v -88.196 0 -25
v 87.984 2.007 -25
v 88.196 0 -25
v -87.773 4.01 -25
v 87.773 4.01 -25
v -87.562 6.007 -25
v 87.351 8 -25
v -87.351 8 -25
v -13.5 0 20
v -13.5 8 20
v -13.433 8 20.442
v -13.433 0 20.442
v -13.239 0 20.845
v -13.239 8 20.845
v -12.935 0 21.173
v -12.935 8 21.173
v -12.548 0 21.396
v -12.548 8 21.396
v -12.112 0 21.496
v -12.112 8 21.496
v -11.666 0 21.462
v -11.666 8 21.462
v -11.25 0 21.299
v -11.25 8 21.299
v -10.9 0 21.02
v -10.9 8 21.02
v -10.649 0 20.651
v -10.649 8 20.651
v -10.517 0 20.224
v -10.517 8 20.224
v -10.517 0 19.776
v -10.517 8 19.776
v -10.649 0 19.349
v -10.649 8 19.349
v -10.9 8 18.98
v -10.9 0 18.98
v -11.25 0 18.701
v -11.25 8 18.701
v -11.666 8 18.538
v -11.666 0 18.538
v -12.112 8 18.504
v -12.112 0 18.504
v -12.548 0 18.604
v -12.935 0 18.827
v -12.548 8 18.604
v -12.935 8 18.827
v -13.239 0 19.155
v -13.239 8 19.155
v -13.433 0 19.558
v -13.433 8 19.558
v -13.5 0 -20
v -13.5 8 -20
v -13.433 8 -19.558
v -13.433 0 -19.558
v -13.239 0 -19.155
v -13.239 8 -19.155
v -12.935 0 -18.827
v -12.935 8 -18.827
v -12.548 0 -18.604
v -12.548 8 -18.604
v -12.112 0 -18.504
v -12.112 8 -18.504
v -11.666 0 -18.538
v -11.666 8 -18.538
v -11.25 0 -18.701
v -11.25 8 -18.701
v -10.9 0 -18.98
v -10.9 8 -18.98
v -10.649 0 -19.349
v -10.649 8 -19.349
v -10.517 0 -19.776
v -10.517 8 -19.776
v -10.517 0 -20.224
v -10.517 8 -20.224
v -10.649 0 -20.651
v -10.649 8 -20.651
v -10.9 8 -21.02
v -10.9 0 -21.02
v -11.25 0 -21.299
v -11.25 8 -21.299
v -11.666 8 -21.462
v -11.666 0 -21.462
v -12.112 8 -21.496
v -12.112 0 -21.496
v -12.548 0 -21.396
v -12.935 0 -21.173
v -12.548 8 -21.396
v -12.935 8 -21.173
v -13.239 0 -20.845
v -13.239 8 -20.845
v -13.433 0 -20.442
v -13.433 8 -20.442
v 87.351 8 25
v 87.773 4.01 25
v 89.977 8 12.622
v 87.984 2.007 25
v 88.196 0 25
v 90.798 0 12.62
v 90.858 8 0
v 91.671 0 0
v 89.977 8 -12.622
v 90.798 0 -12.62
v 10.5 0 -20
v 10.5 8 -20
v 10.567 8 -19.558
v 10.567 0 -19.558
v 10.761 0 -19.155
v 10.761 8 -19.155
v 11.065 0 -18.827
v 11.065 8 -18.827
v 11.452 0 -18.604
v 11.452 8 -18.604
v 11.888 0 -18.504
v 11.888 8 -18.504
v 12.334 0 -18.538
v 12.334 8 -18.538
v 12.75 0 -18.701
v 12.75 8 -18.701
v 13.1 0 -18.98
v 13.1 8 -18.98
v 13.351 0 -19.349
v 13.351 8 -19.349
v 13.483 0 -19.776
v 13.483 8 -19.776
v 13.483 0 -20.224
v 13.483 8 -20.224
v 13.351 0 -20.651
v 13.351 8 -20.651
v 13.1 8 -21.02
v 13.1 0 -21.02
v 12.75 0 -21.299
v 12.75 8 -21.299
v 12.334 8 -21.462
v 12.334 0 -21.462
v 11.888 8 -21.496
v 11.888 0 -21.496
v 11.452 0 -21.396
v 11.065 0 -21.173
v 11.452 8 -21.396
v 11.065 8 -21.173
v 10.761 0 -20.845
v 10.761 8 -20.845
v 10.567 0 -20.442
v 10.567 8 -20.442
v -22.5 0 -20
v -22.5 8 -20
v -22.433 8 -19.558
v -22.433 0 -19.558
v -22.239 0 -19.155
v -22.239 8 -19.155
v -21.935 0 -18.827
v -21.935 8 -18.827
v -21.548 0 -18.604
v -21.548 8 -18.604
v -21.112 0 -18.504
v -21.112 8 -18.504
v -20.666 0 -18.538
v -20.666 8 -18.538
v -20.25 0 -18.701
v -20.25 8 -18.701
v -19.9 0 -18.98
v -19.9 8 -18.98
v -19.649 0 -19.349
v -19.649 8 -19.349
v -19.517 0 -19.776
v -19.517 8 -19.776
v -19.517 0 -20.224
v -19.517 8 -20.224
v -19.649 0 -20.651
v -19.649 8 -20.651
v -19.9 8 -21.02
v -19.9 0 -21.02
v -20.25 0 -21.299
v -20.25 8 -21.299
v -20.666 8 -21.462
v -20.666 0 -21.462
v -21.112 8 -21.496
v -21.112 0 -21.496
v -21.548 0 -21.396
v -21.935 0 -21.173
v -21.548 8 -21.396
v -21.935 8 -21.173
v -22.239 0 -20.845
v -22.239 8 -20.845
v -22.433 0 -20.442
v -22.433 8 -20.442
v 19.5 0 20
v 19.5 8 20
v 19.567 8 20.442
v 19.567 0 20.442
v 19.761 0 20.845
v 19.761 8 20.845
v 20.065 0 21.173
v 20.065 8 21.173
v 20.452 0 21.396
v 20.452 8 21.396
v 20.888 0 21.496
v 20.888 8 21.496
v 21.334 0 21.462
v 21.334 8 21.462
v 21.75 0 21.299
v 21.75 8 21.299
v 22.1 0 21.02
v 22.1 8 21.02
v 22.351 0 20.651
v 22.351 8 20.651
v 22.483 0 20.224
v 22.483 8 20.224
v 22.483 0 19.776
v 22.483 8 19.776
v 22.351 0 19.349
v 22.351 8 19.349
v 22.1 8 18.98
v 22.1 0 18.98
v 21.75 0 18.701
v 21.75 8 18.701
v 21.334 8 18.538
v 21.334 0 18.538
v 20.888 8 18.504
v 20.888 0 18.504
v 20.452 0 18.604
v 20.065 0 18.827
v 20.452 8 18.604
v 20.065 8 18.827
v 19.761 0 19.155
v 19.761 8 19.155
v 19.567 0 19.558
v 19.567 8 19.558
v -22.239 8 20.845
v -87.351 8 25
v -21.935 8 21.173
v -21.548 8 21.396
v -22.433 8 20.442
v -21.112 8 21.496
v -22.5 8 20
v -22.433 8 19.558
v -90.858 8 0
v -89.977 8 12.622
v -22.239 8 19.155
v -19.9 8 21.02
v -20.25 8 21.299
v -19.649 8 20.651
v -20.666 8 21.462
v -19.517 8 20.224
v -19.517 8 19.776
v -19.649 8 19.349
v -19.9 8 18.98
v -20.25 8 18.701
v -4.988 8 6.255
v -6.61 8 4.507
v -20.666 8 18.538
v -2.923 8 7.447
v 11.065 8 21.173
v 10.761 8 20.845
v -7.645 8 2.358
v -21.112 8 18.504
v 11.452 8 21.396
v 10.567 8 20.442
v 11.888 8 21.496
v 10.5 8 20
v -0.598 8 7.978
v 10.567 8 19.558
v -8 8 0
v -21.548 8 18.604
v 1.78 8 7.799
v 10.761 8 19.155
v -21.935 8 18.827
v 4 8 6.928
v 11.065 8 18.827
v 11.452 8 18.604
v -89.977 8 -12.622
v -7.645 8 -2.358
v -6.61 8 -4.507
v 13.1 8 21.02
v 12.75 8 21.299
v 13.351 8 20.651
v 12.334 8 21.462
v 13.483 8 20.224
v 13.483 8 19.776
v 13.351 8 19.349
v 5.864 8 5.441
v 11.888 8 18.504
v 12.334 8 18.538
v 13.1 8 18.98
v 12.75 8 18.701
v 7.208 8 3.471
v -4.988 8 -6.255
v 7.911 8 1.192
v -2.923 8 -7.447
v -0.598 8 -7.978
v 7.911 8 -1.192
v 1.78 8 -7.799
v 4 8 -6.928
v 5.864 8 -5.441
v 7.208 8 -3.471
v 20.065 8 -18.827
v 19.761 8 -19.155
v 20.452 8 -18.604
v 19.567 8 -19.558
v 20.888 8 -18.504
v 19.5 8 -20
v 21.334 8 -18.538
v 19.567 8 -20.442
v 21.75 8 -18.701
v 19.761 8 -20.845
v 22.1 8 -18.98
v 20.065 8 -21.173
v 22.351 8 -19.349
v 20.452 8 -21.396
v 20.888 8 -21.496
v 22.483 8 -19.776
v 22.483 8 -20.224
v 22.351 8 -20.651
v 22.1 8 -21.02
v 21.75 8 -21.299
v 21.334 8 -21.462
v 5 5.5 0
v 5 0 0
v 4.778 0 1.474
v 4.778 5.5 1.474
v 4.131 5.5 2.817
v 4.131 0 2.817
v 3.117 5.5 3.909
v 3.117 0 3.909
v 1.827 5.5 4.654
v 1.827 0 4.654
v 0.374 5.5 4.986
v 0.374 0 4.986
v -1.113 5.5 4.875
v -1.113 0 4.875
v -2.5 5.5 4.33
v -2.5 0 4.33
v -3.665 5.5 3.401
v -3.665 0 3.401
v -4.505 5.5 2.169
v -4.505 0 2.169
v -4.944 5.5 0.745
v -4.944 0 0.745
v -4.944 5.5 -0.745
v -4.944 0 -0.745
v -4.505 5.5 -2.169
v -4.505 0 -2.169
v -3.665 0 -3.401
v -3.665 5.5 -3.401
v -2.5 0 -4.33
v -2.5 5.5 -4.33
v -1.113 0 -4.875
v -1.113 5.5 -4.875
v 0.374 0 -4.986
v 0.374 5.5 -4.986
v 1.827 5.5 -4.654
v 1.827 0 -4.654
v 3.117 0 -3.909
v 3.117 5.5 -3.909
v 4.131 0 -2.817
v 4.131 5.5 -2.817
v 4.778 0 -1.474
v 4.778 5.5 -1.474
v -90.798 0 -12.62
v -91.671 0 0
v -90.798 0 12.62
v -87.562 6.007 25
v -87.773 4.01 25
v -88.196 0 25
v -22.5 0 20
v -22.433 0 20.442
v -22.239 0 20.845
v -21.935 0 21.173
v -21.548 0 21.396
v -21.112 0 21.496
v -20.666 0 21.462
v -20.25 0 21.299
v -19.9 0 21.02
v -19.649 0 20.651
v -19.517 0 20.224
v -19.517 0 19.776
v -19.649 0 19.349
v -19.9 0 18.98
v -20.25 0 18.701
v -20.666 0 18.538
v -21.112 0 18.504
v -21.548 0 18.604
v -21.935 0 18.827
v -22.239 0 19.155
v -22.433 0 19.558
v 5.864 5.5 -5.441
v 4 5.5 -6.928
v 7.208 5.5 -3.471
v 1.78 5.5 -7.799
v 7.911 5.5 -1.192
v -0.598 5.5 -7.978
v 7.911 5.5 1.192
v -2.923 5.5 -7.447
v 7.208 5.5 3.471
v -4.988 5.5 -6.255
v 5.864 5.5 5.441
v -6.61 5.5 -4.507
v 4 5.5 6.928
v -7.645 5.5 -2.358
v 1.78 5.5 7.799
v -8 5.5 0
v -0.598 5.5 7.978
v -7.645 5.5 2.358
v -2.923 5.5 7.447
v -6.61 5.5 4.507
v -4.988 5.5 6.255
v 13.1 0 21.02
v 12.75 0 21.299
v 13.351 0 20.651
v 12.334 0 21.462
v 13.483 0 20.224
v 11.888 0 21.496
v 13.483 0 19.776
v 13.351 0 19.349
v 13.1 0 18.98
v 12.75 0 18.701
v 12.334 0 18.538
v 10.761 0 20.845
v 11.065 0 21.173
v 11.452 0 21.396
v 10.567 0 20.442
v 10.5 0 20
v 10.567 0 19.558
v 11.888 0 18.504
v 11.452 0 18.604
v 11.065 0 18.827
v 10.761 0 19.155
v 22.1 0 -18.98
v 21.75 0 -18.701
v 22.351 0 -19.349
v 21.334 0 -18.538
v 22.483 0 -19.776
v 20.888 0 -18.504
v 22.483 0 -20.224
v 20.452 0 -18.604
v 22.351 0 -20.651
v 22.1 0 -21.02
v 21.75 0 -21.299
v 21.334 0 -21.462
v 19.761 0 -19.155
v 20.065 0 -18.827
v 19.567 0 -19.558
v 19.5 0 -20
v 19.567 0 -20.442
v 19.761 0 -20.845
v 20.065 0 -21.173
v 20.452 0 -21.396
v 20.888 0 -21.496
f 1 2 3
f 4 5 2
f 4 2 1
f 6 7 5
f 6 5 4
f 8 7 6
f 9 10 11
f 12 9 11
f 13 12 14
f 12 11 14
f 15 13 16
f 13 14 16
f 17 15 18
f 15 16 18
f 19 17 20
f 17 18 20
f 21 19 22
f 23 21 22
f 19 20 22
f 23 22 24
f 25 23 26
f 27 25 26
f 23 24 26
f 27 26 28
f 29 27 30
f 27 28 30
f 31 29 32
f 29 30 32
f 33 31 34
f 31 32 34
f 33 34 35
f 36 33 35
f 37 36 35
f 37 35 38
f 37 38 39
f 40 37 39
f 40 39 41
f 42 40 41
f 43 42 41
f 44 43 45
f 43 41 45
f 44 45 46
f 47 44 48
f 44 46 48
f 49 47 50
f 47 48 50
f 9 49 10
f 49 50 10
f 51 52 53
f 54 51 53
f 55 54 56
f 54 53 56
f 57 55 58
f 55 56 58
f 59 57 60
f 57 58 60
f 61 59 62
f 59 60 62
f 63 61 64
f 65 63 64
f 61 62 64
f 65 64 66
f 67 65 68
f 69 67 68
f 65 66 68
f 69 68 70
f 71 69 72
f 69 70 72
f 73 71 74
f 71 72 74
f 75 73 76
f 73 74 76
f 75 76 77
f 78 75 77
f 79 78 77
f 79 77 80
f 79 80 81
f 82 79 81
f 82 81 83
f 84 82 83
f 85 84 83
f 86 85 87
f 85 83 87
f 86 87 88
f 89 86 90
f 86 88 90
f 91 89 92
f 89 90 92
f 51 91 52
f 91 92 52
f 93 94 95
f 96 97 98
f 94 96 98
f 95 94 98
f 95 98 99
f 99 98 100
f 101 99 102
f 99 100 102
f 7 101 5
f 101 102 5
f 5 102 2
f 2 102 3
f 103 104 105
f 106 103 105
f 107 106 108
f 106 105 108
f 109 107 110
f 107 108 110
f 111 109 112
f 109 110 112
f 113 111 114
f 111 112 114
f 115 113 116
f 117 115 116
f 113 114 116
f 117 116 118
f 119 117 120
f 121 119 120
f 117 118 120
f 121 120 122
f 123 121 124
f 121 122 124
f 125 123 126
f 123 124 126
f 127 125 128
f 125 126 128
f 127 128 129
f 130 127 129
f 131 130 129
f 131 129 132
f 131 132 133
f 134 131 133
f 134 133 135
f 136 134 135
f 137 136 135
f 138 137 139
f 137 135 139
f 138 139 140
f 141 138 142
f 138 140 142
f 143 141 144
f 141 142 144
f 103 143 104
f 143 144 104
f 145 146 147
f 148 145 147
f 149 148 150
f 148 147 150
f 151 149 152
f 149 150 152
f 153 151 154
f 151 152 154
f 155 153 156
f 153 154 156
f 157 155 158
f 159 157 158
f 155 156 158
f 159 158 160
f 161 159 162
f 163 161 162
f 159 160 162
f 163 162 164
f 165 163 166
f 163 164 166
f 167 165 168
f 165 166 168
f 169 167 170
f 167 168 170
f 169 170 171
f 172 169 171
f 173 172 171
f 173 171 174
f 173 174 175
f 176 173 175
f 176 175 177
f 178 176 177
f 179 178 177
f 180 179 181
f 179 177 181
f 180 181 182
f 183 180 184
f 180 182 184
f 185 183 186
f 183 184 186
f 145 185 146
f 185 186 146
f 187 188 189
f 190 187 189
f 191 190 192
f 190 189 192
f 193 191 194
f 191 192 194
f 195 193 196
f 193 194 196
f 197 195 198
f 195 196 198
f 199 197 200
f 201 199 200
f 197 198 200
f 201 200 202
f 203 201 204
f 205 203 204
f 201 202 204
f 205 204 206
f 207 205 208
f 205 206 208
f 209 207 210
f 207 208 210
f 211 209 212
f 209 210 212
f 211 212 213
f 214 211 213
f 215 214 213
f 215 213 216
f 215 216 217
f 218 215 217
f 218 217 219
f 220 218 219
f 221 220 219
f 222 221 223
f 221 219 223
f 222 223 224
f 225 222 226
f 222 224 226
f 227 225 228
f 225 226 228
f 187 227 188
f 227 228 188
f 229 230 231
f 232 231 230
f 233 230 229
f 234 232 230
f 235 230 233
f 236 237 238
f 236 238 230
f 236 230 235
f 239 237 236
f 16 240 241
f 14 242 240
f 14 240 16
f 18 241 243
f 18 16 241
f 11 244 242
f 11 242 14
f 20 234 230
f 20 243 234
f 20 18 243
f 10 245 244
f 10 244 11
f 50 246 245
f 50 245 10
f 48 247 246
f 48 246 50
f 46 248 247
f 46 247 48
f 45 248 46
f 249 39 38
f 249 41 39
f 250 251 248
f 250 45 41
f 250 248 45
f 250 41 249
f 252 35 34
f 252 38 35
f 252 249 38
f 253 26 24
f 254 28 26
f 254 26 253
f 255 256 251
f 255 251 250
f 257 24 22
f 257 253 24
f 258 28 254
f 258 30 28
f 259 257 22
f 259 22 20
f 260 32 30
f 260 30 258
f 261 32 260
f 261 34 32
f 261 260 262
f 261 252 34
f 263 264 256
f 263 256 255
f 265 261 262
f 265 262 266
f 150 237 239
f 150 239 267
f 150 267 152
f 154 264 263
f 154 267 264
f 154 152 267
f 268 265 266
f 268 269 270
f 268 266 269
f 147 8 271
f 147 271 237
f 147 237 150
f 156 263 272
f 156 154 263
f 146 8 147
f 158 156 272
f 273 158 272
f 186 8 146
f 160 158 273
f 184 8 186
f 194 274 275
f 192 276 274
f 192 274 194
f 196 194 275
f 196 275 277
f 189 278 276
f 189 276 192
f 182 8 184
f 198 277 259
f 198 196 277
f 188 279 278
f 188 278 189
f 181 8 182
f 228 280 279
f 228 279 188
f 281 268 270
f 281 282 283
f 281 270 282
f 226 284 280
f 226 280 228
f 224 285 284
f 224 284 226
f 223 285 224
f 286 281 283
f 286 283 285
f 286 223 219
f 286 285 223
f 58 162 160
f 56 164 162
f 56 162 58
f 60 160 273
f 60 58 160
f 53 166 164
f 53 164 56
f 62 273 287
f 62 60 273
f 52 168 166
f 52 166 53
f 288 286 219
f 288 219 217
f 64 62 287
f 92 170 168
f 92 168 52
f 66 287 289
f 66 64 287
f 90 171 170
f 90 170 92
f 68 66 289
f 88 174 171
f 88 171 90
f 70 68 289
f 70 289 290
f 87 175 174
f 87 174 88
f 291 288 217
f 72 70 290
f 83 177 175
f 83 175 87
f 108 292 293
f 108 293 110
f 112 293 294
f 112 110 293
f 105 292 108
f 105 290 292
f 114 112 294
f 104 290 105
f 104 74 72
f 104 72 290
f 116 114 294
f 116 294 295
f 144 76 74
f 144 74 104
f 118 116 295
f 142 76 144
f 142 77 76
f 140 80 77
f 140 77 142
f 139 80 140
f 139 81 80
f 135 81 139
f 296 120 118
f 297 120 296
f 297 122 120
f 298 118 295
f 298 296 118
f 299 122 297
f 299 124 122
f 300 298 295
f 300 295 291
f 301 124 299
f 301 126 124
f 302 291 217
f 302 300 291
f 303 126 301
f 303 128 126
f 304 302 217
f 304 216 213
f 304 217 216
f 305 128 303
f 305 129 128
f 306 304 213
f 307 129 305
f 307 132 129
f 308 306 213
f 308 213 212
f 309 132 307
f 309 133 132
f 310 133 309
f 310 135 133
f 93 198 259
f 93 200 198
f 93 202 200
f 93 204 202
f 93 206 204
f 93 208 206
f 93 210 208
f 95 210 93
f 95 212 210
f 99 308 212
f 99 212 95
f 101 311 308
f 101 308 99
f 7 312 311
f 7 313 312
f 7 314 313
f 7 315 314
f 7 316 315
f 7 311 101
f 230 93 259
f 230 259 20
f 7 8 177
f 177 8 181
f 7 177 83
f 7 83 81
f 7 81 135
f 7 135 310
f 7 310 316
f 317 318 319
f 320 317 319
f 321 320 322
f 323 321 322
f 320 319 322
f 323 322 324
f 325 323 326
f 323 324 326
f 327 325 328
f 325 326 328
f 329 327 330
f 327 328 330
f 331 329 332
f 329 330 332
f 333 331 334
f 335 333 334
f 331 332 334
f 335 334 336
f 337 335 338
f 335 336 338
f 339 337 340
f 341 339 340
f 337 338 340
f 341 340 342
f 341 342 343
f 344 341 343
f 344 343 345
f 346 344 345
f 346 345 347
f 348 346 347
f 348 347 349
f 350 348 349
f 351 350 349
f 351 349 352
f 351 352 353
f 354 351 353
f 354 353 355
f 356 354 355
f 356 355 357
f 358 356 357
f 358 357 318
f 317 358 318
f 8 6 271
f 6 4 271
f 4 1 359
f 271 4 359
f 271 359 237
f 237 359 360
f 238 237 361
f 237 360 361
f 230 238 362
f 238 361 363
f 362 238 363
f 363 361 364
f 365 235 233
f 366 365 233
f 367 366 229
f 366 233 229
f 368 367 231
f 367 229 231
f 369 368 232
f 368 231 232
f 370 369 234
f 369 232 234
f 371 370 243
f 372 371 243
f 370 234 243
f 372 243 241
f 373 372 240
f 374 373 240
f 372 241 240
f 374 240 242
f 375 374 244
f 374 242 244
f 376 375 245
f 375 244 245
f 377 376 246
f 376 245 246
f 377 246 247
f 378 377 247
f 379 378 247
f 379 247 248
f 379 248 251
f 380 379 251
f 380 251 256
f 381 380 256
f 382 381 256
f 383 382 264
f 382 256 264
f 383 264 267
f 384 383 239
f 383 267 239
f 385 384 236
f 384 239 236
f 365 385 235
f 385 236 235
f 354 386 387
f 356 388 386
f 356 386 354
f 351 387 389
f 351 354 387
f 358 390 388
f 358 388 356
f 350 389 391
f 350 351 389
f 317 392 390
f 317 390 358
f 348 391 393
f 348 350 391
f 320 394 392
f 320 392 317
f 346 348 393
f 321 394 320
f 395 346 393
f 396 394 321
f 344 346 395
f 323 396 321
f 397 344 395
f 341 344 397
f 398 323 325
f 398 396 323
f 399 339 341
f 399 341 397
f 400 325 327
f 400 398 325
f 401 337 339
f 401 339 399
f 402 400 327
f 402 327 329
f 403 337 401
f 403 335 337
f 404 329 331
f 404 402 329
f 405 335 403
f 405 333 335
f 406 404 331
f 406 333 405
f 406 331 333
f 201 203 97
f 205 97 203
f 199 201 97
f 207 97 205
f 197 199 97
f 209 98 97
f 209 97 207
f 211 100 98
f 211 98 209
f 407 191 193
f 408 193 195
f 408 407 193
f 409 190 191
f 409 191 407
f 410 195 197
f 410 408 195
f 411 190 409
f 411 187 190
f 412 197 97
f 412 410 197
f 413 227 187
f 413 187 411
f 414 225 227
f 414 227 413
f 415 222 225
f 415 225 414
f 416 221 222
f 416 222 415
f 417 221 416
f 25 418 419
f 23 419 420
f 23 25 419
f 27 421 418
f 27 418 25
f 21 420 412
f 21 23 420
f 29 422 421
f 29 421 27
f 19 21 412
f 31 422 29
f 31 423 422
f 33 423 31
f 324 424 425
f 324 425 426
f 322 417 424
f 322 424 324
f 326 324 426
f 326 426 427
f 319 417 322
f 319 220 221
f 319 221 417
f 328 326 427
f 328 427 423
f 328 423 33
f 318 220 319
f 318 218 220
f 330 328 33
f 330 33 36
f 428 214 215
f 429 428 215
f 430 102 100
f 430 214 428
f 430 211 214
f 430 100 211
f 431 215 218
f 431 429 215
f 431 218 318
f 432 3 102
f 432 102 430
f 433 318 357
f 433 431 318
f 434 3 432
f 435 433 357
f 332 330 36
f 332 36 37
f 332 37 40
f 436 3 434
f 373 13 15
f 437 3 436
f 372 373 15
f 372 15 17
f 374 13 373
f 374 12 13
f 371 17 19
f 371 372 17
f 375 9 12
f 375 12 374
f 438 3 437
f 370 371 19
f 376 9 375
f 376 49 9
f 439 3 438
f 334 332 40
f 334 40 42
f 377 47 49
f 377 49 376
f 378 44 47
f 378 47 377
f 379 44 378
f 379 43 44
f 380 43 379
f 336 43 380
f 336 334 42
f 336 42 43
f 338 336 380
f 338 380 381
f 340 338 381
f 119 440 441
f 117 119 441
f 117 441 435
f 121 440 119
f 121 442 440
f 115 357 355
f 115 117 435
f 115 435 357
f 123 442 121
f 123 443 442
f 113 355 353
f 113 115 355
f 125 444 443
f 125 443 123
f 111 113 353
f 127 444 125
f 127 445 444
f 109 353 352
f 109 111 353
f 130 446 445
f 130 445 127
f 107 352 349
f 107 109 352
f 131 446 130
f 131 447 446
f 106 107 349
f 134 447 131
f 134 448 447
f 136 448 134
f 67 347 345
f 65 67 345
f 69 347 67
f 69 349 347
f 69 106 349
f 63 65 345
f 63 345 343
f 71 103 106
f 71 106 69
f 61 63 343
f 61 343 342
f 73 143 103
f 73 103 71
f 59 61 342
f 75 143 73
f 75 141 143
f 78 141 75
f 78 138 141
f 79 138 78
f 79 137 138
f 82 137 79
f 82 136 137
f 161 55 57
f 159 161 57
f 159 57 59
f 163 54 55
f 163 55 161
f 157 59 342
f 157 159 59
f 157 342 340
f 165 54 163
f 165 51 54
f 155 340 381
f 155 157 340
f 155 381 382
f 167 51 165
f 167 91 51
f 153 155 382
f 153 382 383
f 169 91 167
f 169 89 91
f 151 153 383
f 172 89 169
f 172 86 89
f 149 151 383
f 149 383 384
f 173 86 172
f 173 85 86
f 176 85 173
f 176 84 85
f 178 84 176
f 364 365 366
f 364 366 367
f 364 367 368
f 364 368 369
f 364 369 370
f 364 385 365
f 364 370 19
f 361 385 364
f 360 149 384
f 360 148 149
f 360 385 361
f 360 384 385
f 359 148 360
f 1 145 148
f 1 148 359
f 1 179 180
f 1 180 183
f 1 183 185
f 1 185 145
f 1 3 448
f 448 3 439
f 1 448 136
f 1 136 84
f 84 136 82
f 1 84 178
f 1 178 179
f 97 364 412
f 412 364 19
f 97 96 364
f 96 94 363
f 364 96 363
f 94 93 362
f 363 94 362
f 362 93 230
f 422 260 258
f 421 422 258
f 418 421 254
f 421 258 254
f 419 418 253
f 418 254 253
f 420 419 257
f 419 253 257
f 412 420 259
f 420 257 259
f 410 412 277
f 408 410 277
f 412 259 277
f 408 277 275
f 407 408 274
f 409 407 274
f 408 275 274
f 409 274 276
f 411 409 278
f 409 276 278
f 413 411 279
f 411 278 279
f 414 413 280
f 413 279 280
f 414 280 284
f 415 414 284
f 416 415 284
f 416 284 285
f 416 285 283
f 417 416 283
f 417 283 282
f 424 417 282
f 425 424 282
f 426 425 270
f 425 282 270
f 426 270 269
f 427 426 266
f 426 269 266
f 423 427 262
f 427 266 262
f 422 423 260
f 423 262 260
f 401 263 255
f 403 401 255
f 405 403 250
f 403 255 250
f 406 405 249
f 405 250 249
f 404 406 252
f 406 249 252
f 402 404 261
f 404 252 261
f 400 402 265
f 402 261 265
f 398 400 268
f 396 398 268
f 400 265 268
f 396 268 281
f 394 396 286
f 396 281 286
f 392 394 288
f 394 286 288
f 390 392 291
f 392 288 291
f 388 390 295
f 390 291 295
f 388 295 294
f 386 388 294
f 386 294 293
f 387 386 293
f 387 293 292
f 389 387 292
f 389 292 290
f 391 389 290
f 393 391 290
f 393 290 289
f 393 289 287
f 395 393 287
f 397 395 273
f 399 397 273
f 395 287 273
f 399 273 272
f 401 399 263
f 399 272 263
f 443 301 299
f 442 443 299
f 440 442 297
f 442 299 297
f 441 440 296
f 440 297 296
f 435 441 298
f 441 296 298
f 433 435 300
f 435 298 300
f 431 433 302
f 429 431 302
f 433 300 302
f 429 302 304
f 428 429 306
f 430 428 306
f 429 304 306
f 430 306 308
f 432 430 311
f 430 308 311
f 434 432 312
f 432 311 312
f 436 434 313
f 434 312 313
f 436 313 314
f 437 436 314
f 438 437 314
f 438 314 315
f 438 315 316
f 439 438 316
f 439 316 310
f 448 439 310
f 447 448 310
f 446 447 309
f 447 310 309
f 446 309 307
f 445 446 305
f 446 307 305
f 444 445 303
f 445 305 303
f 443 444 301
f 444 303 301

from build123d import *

# Parameters (mm, degrees)
BASE_PLATE_BOSS_EXTRUDE1_DEPTH                 = 25
BASE_PLATE_BOSS_EXTRUDE1_DEPTH_BACK            = 25
SKETCH5_R                                      = 5
SHAFT_CUT_EXTRUDE1_DEPTH                       = 8
SKETCH6_R                                      = 8
SHAFT_BEARING_CUT_EXTRUDE2_DEPTH               = 2.5
SKETCH7_R                                      = 1.5
BEARING_PLATE_MOUNTING_HOLES_CUT_EXTRUDE_DEPTH = 8
SKETCH8_R                                      = 1.5
BASE_SIDE_MOUNTING_HOLES_CUT_EXTRUDE4_DEPTH    = 8


with BuildPart() as part:
    # Sketch3 → Base Plate Boss-Extrude1 (new, two sides: drawn at the far end of the back side and taken through both)
    with BuildSketch(Plane.XY.offset(-BASE_PLATE_BOSS_EXTRUDE1_DEPTH_BACK)):
        Polygon((90.858272566, 8), (91.670882932, 0), (-91.670882932, 0), (-90.858272566, 8), align=None)
    extrude(amount=BASE_PLATE_BOSS_EXTRUDE1_DEPTH + BASE_PLATE_BOSS_EXTRUDE1_DEPTH_BACK)

    # Sketch4 → Base Plate Chassi Rounding Cut-Revolve1 (revolve, cut)
    with BuildSketch(Plane.XY):
        Polygon((90.858272566, 8), (91.670882932, 0), (97.920865853, 0), (97.920865853, 8), (91.670882932, 8), align=None)
    revolve(axis=Axis((0, 0, 0), (0, 1, 0)), mode=Mode.SUBTRACT)

    # Sketch5 → Shaft Cut-Extrude1 (cut)
    with BuildSketch(Plane.XZ):
        Circle(SKETCH5_R)
    extrude(amount=-SHAFT_CUT_EXTRUDE1_DEPTH, mode=Mode.SUBTRACT)

    # Sketch6 → Shaft Bearing Cut-Extrude2 (cut)
    with BuildSketch(Plane(origin=(0, 8, 0), x_dir=(1, 0, 0), z_dir=(0, 1, 0))):
        with Locations(Location((0, 0, 0), (0, 0, 180))):
            Circle(SKETCH6_R)
    extrude(amount=-SHAFT_BEARING_CUT_EXTRUDE2_DEPTH, mode=Mode.SUBTRACT)

    # Sketch7 → Bearing Plate Mounting Holes Cut-Extrude3 (cut)
    with BuildSketch(Plane(origin=(0, 8, 0), x_dir=(1, 0, 0), z_dir=(0, 1, 0))):
        with Locations(Location((12, 20, 0), (0, 0, 180))):
            Circle(SKETCH7_R)
        with Locations(Location((-12, 20, 0), (0, 0, 180))):
            Circle(SKETCH7_R)
        with Locations(Location((-12, -20, 0), (0, 0, 180))):
            Circle(SKETCH7_R)
        with Locations(Location((12, -20, 0), (0, 0, 180))):
            Circle(SKETCH7_R)
    extrude(amount=-BEARING_PLATE_MOUNTING_HOLES_CUT_EXTRUDE_DEPTH, mode=Mode.SUBTRACT)

    # Sketch8 → Base Side Mounting Holes Cut-Extrude4 (cut)
    with BuildSketch(Plane(origin=(0, 8, 0), x_dir=(1, 0, 0), z_dir=(0, 1, 0))):
        with Locations(Location((21, 20, 0), (0, 0, 180))):
            Circle(SKETCH8_R)
        with Locations(Location((-21, 20, 0), (0, 0, 180))):
            Circle(SKETCH8_R)
        with Locations(Location((-21, -20, 0), (0, 0, 180))):
            Circle(SKETCH8_R)
        with Locations(Location((21, -20, 0), (0, 0, 180))):
            Circle(SKETCH8_R)
    extrude(amount=-BASE_SIDE_MOUNTING_HOLES_CUT_EXTRUDE4_DEPTH, mode=Mode.SUBTRACT)


solid = part.part
